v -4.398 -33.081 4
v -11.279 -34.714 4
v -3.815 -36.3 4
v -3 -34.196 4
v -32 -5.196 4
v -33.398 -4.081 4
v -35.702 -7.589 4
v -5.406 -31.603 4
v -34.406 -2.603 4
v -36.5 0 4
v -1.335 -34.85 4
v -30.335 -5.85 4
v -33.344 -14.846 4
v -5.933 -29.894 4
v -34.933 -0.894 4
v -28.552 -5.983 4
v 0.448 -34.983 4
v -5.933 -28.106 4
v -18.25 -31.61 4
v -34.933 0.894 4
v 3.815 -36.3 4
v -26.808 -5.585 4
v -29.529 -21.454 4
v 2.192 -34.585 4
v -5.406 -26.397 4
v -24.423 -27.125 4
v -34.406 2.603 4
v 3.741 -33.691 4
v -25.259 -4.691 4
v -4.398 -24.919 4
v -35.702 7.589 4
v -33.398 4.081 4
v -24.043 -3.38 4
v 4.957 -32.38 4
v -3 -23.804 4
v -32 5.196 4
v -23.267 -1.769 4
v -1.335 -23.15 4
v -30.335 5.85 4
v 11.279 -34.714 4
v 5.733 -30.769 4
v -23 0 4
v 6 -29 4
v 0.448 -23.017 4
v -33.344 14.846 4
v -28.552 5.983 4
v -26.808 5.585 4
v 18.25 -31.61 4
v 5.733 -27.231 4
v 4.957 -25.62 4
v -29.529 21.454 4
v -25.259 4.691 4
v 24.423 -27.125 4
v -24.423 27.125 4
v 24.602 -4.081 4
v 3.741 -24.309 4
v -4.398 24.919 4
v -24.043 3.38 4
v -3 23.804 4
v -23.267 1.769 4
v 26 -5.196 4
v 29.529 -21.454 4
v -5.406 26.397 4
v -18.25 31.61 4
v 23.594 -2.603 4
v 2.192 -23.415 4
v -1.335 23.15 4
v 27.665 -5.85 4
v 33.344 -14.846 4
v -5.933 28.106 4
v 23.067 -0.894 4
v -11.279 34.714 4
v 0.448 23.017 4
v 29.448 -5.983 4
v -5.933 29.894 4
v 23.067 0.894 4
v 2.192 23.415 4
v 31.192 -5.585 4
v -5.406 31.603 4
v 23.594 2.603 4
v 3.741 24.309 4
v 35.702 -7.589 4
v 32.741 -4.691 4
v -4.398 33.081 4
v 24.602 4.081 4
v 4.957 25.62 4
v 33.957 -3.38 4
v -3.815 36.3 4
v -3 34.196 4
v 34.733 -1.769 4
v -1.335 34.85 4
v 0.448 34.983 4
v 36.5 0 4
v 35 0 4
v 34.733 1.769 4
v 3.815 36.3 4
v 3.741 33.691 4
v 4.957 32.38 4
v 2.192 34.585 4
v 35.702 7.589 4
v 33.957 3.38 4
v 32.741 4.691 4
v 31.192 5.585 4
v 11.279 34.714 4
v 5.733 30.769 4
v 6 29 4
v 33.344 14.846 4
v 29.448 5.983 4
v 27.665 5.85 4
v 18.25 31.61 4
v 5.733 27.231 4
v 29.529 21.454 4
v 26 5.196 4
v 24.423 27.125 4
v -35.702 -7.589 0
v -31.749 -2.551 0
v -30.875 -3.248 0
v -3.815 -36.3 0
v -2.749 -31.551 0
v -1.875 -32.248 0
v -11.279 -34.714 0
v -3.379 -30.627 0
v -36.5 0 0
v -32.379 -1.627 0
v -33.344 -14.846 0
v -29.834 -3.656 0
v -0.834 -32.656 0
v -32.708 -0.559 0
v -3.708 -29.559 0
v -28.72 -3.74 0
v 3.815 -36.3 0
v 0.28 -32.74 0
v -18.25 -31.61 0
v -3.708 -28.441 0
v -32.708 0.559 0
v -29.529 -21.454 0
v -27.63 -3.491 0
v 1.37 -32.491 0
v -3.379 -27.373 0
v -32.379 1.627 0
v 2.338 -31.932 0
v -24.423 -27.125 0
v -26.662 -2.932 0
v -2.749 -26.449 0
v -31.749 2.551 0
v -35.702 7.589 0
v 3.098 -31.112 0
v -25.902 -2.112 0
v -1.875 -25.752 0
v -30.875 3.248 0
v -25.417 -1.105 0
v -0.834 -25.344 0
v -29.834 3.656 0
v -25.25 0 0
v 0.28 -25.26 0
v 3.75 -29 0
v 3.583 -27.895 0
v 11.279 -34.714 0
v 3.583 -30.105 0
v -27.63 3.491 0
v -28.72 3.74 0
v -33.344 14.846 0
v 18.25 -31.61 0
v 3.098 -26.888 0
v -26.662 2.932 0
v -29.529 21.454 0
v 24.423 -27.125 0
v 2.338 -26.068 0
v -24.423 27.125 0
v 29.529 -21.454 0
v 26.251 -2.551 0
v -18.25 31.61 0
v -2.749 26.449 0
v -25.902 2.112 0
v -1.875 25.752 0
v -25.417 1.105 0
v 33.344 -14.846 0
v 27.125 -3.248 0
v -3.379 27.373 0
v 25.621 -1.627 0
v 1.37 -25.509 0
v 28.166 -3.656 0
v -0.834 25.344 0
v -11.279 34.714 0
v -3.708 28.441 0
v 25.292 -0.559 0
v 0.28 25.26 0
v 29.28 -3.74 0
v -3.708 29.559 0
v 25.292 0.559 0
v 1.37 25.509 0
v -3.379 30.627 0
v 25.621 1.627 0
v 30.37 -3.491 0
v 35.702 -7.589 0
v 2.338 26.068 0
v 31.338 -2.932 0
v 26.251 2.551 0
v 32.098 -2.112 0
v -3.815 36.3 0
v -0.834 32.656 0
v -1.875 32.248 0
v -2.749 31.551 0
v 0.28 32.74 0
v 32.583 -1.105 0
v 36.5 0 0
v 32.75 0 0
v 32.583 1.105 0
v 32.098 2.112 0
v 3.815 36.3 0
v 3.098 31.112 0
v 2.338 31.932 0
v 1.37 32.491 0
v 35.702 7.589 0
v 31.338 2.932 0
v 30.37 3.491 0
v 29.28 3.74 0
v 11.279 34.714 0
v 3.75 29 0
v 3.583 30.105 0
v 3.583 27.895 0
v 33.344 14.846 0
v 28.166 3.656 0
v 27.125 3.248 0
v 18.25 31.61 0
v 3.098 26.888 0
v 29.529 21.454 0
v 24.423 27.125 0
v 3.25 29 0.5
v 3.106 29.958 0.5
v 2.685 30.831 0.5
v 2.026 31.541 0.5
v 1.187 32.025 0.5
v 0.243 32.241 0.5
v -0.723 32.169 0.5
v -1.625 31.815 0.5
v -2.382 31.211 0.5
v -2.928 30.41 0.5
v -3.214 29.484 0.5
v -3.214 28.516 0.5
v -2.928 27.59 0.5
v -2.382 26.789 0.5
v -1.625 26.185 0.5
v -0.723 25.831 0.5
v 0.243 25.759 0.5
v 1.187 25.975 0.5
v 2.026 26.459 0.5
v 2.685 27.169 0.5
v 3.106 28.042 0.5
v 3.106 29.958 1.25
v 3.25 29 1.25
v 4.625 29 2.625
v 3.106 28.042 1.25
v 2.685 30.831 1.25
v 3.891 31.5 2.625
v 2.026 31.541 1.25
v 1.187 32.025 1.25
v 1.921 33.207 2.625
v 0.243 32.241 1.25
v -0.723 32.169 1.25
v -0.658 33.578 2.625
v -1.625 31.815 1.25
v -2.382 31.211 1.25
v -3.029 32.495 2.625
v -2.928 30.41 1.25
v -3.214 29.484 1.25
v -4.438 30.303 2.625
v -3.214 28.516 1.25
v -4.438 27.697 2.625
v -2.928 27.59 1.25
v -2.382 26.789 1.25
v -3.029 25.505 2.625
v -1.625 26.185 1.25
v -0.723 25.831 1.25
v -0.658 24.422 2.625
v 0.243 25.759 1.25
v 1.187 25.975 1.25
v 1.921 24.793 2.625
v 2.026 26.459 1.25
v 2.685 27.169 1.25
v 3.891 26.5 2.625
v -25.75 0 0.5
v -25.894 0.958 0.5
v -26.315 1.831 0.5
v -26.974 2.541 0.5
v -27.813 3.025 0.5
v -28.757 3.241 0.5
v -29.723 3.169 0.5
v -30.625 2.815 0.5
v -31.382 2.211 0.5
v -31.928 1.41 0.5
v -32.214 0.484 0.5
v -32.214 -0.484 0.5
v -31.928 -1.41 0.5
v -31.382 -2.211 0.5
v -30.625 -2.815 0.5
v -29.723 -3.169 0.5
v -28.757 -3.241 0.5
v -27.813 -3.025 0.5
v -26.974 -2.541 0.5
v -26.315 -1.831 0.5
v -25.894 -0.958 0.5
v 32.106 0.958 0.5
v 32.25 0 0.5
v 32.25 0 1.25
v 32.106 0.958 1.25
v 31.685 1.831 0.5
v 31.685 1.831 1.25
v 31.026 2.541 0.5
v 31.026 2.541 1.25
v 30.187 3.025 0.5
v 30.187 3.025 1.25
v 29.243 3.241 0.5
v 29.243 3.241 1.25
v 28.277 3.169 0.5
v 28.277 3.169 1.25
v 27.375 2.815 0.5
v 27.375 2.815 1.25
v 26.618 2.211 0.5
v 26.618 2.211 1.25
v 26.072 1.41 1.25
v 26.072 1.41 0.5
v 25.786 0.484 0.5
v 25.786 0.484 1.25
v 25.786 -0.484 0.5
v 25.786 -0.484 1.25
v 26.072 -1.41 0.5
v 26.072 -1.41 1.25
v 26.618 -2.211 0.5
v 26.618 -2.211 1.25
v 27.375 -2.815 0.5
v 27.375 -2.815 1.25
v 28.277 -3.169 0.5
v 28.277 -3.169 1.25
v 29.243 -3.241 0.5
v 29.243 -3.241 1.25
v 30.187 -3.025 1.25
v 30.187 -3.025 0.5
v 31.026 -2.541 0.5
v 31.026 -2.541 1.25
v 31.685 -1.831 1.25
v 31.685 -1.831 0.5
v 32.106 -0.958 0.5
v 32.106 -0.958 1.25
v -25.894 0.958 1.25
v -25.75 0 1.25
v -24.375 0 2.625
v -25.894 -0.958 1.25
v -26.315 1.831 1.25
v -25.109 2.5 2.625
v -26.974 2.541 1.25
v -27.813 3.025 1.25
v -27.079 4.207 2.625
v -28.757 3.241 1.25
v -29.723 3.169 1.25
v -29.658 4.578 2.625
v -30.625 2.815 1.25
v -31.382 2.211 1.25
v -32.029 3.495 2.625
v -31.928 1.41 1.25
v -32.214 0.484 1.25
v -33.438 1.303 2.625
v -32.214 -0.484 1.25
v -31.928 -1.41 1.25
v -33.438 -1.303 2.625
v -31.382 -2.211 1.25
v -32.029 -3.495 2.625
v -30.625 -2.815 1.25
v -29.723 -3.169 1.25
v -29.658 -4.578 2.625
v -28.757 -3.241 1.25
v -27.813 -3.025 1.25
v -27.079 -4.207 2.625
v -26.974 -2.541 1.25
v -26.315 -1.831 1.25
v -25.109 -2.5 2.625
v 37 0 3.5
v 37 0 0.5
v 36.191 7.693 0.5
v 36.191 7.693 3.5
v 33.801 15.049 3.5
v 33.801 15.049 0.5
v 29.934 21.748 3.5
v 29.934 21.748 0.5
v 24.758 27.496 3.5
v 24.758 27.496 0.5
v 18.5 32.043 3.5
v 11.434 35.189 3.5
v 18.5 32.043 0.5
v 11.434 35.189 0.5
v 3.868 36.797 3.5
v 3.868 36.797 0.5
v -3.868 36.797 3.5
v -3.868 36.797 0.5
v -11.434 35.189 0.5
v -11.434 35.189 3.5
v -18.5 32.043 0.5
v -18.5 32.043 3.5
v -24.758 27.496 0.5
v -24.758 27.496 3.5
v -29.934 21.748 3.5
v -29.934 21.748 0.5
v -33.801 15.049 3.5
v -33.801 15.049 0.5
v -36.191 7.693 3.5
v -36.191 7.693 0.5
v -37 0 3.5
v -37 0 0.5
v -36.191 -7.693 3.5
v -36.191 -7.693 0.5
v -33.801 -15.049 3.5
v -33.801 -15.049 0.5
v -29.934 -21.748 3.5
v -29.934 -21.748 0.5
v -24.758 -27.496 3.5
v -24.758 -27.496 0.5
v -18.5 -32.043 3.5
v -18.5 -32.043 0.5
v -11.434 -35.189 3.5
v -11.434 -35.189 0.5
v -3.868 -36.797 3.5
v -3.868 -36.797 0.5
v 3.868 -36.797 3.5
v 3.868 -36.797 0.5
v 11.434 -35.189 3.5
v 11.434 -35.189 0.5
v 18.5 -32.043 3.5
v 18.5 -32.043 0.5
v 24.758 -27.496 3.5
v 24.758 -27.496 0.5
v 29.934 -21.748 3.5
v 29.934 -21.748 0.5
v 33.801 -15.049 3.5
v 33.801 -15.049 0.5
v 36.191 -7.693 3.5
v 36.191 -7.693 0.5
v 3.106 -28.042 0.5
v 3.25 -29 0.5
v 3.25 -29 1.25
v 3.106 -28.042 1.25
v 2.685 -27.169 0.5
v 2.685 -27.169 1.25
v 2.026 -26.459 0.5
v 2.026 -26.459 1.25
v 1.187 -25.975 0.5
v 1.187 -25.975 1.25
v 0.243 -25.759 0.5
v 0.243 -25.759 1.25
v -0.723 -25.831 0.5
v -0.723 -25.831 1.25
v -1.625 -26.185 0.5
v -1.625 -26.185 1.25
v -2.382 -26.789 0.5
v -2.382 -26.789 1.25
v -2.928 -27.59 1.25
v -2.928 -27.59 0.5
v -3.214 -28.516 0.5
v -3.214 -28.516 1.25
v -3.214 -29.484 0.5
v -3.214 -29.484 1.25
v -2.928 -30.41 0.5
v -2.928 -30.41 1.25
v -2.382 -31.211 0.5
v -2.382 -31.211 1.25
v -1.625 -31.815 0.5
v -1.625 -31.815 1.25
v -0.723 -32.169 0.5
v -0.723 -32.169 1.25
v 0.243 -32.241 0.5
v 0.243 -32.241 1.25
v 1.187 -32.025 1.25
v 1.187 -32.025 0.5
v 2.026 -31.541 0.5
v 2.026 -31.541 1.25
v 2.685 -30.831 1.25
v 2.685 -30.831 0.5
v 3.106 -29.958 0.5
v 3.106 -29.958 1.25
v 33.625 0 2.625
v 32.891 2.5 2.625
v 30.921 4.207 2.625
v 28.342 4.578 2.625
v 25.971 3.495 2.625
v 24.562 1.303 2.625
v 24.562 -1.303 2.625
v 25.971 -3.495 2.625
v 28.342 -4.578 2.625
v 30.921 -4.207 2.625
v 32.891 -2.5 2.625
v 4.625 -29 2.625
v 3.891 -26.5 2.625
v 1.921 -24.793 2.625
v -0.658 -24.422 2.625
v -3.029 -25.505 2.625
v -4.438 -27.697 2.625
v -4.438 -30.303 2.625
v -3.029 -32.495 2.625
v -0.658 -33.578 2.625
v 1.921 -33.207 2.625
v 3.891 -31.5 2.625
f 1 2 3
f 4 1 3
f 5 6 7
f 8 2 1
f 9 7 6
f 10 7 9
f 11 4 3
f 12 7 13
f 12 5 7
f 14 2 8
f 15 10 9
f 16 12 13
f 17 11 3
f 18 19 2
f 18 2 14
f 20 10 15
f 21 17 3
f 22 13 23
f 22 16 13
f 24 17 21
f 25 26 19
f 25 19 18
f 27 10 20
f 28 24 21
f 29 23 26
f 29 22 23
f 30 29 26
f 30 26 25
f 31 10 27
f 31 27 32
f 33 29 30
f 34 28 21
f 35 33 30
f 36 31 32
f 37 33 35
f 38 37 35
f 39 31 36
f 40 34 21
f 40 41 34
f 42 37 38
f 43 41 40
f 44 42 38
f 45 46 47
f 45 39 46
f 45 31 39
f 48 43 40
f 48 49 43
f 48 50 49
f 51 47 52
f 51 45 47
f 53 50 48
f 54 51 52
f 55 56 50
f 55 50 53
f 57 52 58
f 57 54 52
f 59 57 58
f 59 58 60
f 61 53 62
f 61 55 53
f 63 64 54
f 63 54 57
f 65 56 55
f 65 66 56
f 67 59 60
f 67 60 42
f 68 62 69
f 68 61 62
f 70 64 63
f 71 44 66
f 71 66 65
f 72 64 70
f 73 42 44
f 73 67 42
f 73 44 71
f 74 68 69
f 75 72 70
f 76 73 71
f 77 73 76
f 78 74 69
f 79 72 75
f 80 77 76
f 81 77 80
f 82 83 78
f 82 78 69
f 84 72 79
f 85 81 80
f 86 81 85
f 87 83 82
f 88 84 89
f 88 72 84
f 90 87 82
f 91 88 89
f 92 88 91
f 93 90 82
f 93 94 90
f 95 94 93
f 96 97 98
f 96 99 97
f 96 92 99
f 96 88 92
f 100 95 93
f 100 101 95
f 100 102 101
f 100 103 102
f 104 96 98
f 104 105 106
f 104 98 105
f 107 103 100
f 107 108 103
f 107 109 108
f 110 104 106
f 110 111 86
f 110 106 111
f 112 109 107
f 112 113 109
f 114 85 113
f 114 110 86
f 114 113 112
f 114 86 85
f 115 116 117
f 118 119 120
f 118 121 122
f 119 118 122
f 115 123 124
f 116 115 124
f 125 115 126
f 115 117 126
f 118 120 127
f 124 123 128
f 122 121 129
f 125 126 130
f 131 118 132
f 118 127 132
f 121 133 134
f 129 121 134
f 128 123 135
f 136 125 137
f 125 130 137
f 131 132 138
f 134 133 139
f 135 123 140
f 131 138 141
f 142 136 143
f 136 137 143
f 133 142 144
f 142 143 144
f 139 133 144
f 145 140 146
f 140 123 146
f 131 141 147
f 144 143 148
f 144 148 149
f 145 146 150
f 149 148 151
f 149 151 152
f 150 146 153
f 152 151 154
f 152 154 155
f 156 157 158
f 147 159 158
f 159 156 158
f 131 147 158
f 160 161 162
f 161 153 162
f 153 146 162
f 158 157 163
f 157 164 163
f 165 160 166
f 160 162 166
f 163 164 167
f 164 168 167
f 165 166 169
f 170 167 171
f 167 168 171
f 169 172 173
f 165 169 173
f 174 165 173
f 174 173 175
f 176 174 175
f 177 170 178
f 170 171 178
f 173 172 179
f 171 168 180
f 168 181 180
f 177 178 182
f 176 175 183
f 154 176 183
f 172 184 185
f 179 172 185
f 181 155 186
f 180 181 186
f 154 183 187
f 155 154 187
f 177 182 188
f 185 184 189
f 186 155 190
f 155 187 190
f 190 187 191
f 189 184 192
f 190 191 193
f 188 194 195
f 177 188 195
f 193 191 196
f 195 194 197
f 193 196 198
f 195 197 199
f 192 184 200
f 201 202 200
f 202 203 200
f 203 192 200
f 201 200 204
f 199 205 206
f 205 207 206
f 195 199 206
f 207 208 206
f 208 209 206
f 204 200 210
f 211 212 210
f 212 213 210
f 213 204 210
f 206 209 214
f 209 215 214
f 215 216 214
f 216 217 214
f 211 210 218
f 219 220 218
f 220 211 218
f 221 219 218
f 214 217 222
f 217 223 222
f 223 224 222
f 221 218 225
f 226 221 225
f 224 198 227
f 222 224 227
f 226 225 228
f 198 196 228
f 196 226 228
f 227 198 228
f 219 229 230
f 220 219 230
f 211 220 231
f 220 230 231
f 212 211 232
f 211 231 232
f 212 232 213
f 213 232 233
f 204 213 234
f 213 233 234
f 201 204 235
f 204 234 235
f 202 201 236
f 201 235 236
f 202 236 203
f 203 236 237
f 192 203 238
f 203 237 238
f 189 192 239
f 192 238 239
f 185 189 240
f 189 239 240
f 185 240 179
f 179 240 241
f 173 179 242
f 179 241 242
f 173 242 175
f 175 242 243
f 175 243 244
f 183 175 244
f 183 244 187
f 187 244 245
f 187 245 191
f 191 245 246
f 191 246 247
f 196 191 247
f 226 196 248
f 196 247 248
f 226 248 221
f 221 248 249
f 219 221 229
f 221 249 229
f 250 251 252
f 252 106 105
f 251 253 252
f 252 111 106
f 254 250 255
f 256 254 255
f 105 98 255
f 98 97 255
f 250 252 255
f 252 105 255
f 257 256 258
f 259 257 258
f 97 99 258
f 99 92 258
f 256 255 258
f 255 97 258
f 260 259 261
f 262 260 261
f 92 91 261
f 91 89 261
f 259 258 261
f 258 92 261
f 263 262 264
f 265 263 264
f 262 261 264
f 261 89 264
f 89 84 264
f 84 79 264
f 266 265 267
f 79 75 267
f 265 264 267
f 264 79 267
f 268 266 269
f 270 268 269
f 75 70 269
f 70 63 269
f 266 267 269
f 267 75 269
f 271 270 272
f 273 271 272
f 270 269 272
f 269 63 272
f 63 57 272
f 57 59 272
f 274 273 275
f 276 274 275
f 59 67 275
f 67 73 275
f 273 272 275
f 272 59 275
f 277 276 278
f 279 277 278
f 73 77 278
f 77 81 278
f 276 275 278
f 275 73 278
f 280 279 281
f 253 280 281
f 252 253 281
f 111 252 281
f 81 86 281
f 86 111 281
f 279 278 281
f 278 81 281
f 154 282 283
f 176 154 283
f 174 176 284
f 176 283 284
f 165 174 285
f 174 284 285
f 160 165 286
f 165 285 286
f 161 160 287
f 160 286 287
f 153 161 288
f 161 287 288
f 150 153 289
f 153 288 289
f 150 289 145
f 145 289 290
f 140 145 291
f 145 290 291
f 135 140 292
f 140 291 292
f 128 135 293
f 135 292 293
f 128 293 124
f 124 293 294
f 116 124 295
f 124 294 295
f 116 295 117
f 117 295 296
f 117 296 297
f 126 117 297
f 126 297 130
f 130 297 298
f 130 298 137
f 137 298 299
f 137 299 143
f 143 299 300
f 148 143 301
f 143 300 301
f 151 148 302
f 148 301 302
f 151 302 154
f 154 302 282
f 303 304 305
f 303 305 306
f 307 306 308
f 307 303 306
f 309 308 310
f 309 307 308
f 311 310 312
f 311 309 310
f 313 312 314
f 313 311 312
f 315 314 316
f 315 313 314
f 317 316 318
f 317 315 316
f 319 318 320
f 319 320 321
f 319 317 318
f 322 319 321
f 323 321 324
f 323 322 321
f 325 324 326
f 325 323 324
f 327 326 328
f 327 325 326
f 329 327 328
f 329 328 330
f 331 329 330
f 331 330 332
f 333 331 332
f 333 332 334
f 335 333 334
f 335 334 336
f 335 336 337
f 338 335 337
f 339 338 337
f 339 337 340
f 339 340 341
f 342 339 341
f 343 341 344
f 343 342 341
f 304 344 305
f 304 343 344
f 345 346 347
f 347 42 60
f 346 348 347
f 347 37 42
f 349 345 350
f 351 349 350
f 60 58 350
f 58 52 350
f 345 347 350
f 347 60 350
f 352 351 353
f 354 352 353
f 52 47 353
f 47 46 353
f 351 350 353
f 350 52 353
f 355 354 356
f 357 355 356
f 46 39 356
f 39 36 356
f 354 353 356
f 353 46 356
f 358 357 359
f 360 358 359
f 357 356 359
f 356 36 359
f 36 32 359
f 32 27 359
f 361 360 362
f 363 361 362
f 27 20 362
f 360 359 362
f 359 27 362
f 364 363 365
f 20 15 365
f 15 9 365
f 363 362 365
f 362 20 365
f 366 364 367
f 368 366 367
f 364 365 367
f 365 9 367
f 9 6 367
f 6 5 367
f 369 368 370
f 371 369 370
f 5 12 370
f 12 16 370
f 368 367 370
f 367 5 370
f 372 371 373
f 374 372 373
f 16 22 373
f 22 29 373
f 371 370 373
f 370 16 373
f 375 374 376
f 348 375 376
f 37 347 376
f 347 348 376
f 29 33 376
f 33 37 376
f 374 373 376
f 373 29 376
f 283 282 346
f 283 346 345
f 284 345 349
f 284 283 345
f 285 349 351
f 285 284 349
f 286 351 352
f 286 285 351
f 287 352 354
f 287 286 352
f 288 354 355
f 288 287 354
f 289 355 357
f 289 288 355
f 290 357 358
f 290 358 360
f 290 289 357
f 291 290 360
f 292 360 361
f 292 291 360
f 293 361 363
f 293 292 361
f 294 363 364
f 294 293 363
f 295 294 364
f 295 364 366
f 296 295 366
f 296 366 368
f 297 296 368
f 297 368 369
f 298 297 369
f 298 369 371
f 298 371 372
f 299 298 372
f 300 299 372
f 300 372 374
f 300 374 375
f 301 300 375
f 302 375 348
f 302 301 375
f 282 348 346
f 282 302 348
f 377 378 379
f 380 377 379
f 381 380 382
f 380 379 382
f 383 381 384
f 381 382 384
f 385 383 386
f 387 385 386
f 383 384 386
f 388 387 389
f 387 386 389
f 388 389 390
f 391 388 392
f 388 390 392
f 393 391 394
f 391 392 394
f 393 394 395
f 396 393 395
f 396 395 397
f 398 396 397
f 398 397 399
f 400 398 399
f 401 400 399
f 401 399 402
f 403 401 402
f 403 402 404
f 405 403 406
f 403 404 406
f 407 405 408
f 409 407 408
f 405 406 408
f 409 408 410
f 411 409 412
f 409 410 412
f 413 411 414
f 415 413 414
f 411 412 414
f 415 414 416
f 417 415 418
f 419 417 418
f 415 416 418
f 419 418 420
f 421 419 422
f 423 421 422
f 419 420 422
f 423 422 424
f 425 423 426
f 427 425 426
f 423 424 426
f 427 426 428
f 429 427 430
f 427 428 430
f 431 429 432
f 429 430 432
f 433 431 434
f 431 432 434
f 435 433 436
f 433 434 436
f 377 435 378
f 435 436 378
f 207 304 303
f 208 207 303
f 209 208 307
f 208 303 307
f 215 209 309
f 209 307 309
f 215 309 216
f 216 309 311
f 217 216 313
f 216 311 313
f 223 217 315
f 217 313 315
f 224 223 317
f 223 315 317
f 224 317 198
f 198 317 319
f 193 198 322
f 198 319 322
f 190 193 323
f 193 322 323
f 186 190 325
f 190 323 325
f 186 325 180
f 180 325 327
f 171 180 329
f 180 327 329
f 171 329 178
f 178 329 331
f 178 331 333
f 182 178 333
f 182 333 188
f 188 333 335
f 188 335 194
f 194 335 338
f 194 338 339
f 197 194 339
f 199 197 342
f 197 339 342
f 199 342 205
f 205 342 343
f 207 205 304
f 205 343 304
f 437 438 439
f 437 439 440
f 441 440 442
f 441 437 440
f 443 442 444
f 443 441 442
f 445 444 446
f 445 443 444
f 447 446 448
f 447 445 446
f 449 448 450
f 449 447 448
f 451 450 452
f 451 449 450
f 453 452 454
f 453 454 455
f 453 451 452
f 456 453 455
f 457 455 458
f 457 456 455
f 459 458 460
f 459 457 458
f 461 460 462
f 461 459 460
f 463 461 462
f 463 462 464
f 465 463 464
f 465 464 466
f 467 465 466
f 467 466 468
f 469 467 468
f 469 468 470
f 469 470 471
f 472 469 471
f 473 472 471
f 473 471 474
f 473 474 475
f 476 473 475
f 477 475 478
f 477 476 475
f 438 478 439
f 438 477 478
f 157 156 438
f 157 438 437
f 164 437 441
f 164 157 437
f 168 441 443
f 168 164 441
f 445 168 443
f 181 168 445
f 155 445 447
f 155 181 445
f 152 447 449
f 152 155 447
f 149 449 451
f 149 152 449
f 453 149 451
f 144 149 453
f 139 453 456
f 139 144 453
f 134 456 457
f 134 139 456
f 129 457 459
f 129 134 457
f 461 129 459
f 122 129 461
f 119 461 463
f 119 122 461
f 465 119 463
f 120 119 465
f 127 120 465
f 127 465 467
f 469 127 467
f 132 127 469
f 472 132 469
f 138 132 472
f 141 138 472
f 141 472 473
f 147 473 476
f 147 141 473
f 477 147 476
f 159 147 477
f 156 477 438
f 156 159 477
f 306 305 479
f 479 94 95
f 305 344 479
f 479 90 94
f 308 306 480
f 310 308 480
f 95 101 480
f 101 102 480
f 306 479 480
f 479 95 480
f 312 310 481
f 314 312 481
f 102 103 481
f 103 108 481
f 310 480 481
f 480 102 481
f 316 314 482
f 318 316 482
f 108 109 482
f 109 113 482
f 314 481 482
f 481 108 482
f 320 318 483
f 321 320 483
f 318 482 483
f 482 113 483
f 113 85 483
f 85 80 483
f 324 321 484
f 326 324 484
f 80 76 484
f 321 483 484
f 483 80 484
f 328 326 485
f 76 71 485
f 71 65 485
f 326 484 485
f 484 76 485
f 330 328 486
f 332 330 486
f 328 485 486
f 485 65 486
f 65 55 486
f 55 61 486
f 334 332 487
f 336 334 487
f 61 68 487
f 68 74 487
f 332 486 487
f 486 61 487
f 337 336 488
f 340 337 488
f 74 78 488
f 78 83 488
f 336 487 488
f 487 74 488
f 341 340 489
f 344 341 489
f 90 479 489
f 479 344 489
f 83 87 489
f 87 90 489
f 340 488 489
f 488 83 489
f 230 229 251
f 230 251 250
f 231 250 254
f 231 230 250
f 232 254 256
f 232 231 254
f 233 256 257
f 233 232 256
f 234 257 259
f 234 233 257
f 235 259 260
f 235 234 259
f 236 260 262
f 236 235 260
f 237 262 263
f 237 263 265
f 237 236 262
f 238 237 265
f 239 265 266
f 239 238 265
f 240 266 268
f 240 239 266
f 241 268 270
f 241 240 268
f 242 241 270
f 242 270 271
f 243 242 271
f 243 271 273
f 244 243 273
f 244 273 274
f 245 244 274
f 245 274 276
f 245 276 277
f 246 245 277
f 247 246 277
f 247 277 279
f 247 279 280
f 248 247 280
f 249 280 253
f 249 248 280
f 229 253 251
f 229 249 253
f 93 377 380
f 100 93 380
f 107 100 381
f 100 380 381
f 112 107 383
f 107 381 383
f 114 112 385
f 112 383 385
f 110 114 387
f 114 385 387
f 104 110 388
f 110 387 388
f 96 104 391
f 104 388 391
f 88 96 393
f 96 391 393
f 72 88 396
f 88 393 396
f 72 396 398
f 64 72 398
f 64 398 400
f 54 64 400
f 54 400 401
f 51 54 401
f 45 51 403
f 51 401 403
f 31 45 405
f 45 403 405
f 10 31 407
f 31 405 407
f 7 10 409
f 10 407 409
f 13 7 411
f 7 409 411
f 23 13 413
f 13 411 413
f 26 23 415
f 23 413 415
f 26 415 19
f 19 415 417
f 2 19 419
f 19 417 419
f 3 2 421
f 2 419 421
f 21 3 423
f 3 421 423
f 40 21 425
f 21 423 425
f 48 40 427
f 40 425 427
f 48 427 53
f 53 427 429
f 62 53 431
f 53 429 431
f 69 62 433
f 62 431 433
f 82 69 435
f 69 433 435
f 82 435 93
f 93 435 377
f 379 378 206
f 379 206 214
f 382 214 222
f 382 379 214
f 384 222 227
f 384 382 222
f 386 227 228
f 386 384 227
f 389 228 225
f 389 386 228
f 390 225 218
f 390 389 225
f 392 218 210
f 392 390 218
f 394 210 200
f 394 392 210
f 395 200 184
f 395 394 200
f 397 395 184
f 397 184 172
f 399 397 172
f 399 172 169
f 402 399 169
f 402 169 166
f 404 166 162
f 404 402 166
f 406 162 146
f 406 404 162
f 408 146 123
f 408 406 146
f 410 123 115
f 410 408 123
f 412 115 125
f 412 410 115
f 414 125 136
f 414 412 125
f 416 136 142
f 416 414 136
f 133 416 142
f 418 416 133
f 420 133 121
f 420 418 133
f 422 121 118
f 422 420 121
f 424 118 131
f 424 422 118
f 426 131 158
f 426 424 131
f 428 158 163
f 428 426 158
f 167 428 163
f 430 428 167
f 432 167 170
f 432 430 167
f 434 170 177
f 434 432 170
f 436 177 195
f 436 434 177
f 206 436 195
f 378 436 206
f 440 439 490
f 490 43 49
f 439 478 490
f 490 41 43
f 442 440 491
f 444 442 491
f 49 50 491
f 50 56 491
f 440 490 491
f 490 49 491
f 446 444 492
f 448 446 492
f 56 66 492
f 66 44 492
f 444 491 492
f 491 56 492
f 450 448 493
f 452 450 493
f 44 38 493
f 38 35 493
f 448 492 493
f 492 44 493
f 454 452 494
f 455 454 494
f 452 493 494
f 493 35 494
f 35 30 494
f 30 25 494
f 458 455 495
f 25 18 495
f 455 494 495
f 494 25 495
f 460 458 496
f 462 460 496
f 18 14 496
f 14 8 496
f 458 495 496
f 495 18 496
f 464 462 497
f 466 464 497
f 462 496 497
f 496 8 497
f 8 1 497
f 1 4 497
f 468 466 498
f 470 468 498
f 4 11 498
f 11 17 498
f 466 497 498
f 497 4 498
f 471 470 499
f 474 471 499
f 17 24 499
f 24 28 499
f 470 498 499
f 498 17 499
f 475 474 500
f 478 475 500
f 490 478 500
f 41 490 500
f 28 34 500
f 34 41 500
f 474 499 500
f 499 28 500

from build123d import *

# Parameters (mm, degrees)
F0_R     = 37
F0_R_2   = 3.25
F1_DEPTH = 4
F2_SIZE  = 2.75
F3_SIZE  = 0.5


with BuildPart() as f1:
    # F0 (on Top) → F1 (new body)
    with BuildSketch(Plane.XY):
        Circle(F0_R)
        with Locations((0, -29)):
            Circle(F0_R_2, mode=Mode.SUBTRACT)
        with Locations((-29, 0)):
            Circle(F0_R_2, mode=Mode.SUBTRACT)
        with Locations((29, 0)):
            Circle(F0_R_2, mode=Mode.SUBTRACT)
        with Locations((0, 29)):
            Circle(F0_R_2, mode=Mode.SUBTRACT)
    extrude(amount=F1_DEPTH)

    # F2
    f2_edges = [f1.edges().sort_by_distance(p)[0] for p in [
        (-3.25, -29, 4),
        (-32.25, 0, 4),
        (-3.25, 29, 4),
        (25.75, 0, 4),
    ]]
    chamfer(f2_edges, length=F2_SIZE)

    # F3
    f3_edges = [f1.edges().sort_by_distance(p)[0] for p in [
        (37, 0, 2),
        (-37, 0, 0),
        (-37, 0, 4),
        (-3.25, -29, 0),
        (-32.25, 0, 0),
        (-3.25, 29, 0),
        (25.75, 0, 0),
    ]]
    chamfer(f3_edges, length=F3_SIZE)


solid = f1.part
